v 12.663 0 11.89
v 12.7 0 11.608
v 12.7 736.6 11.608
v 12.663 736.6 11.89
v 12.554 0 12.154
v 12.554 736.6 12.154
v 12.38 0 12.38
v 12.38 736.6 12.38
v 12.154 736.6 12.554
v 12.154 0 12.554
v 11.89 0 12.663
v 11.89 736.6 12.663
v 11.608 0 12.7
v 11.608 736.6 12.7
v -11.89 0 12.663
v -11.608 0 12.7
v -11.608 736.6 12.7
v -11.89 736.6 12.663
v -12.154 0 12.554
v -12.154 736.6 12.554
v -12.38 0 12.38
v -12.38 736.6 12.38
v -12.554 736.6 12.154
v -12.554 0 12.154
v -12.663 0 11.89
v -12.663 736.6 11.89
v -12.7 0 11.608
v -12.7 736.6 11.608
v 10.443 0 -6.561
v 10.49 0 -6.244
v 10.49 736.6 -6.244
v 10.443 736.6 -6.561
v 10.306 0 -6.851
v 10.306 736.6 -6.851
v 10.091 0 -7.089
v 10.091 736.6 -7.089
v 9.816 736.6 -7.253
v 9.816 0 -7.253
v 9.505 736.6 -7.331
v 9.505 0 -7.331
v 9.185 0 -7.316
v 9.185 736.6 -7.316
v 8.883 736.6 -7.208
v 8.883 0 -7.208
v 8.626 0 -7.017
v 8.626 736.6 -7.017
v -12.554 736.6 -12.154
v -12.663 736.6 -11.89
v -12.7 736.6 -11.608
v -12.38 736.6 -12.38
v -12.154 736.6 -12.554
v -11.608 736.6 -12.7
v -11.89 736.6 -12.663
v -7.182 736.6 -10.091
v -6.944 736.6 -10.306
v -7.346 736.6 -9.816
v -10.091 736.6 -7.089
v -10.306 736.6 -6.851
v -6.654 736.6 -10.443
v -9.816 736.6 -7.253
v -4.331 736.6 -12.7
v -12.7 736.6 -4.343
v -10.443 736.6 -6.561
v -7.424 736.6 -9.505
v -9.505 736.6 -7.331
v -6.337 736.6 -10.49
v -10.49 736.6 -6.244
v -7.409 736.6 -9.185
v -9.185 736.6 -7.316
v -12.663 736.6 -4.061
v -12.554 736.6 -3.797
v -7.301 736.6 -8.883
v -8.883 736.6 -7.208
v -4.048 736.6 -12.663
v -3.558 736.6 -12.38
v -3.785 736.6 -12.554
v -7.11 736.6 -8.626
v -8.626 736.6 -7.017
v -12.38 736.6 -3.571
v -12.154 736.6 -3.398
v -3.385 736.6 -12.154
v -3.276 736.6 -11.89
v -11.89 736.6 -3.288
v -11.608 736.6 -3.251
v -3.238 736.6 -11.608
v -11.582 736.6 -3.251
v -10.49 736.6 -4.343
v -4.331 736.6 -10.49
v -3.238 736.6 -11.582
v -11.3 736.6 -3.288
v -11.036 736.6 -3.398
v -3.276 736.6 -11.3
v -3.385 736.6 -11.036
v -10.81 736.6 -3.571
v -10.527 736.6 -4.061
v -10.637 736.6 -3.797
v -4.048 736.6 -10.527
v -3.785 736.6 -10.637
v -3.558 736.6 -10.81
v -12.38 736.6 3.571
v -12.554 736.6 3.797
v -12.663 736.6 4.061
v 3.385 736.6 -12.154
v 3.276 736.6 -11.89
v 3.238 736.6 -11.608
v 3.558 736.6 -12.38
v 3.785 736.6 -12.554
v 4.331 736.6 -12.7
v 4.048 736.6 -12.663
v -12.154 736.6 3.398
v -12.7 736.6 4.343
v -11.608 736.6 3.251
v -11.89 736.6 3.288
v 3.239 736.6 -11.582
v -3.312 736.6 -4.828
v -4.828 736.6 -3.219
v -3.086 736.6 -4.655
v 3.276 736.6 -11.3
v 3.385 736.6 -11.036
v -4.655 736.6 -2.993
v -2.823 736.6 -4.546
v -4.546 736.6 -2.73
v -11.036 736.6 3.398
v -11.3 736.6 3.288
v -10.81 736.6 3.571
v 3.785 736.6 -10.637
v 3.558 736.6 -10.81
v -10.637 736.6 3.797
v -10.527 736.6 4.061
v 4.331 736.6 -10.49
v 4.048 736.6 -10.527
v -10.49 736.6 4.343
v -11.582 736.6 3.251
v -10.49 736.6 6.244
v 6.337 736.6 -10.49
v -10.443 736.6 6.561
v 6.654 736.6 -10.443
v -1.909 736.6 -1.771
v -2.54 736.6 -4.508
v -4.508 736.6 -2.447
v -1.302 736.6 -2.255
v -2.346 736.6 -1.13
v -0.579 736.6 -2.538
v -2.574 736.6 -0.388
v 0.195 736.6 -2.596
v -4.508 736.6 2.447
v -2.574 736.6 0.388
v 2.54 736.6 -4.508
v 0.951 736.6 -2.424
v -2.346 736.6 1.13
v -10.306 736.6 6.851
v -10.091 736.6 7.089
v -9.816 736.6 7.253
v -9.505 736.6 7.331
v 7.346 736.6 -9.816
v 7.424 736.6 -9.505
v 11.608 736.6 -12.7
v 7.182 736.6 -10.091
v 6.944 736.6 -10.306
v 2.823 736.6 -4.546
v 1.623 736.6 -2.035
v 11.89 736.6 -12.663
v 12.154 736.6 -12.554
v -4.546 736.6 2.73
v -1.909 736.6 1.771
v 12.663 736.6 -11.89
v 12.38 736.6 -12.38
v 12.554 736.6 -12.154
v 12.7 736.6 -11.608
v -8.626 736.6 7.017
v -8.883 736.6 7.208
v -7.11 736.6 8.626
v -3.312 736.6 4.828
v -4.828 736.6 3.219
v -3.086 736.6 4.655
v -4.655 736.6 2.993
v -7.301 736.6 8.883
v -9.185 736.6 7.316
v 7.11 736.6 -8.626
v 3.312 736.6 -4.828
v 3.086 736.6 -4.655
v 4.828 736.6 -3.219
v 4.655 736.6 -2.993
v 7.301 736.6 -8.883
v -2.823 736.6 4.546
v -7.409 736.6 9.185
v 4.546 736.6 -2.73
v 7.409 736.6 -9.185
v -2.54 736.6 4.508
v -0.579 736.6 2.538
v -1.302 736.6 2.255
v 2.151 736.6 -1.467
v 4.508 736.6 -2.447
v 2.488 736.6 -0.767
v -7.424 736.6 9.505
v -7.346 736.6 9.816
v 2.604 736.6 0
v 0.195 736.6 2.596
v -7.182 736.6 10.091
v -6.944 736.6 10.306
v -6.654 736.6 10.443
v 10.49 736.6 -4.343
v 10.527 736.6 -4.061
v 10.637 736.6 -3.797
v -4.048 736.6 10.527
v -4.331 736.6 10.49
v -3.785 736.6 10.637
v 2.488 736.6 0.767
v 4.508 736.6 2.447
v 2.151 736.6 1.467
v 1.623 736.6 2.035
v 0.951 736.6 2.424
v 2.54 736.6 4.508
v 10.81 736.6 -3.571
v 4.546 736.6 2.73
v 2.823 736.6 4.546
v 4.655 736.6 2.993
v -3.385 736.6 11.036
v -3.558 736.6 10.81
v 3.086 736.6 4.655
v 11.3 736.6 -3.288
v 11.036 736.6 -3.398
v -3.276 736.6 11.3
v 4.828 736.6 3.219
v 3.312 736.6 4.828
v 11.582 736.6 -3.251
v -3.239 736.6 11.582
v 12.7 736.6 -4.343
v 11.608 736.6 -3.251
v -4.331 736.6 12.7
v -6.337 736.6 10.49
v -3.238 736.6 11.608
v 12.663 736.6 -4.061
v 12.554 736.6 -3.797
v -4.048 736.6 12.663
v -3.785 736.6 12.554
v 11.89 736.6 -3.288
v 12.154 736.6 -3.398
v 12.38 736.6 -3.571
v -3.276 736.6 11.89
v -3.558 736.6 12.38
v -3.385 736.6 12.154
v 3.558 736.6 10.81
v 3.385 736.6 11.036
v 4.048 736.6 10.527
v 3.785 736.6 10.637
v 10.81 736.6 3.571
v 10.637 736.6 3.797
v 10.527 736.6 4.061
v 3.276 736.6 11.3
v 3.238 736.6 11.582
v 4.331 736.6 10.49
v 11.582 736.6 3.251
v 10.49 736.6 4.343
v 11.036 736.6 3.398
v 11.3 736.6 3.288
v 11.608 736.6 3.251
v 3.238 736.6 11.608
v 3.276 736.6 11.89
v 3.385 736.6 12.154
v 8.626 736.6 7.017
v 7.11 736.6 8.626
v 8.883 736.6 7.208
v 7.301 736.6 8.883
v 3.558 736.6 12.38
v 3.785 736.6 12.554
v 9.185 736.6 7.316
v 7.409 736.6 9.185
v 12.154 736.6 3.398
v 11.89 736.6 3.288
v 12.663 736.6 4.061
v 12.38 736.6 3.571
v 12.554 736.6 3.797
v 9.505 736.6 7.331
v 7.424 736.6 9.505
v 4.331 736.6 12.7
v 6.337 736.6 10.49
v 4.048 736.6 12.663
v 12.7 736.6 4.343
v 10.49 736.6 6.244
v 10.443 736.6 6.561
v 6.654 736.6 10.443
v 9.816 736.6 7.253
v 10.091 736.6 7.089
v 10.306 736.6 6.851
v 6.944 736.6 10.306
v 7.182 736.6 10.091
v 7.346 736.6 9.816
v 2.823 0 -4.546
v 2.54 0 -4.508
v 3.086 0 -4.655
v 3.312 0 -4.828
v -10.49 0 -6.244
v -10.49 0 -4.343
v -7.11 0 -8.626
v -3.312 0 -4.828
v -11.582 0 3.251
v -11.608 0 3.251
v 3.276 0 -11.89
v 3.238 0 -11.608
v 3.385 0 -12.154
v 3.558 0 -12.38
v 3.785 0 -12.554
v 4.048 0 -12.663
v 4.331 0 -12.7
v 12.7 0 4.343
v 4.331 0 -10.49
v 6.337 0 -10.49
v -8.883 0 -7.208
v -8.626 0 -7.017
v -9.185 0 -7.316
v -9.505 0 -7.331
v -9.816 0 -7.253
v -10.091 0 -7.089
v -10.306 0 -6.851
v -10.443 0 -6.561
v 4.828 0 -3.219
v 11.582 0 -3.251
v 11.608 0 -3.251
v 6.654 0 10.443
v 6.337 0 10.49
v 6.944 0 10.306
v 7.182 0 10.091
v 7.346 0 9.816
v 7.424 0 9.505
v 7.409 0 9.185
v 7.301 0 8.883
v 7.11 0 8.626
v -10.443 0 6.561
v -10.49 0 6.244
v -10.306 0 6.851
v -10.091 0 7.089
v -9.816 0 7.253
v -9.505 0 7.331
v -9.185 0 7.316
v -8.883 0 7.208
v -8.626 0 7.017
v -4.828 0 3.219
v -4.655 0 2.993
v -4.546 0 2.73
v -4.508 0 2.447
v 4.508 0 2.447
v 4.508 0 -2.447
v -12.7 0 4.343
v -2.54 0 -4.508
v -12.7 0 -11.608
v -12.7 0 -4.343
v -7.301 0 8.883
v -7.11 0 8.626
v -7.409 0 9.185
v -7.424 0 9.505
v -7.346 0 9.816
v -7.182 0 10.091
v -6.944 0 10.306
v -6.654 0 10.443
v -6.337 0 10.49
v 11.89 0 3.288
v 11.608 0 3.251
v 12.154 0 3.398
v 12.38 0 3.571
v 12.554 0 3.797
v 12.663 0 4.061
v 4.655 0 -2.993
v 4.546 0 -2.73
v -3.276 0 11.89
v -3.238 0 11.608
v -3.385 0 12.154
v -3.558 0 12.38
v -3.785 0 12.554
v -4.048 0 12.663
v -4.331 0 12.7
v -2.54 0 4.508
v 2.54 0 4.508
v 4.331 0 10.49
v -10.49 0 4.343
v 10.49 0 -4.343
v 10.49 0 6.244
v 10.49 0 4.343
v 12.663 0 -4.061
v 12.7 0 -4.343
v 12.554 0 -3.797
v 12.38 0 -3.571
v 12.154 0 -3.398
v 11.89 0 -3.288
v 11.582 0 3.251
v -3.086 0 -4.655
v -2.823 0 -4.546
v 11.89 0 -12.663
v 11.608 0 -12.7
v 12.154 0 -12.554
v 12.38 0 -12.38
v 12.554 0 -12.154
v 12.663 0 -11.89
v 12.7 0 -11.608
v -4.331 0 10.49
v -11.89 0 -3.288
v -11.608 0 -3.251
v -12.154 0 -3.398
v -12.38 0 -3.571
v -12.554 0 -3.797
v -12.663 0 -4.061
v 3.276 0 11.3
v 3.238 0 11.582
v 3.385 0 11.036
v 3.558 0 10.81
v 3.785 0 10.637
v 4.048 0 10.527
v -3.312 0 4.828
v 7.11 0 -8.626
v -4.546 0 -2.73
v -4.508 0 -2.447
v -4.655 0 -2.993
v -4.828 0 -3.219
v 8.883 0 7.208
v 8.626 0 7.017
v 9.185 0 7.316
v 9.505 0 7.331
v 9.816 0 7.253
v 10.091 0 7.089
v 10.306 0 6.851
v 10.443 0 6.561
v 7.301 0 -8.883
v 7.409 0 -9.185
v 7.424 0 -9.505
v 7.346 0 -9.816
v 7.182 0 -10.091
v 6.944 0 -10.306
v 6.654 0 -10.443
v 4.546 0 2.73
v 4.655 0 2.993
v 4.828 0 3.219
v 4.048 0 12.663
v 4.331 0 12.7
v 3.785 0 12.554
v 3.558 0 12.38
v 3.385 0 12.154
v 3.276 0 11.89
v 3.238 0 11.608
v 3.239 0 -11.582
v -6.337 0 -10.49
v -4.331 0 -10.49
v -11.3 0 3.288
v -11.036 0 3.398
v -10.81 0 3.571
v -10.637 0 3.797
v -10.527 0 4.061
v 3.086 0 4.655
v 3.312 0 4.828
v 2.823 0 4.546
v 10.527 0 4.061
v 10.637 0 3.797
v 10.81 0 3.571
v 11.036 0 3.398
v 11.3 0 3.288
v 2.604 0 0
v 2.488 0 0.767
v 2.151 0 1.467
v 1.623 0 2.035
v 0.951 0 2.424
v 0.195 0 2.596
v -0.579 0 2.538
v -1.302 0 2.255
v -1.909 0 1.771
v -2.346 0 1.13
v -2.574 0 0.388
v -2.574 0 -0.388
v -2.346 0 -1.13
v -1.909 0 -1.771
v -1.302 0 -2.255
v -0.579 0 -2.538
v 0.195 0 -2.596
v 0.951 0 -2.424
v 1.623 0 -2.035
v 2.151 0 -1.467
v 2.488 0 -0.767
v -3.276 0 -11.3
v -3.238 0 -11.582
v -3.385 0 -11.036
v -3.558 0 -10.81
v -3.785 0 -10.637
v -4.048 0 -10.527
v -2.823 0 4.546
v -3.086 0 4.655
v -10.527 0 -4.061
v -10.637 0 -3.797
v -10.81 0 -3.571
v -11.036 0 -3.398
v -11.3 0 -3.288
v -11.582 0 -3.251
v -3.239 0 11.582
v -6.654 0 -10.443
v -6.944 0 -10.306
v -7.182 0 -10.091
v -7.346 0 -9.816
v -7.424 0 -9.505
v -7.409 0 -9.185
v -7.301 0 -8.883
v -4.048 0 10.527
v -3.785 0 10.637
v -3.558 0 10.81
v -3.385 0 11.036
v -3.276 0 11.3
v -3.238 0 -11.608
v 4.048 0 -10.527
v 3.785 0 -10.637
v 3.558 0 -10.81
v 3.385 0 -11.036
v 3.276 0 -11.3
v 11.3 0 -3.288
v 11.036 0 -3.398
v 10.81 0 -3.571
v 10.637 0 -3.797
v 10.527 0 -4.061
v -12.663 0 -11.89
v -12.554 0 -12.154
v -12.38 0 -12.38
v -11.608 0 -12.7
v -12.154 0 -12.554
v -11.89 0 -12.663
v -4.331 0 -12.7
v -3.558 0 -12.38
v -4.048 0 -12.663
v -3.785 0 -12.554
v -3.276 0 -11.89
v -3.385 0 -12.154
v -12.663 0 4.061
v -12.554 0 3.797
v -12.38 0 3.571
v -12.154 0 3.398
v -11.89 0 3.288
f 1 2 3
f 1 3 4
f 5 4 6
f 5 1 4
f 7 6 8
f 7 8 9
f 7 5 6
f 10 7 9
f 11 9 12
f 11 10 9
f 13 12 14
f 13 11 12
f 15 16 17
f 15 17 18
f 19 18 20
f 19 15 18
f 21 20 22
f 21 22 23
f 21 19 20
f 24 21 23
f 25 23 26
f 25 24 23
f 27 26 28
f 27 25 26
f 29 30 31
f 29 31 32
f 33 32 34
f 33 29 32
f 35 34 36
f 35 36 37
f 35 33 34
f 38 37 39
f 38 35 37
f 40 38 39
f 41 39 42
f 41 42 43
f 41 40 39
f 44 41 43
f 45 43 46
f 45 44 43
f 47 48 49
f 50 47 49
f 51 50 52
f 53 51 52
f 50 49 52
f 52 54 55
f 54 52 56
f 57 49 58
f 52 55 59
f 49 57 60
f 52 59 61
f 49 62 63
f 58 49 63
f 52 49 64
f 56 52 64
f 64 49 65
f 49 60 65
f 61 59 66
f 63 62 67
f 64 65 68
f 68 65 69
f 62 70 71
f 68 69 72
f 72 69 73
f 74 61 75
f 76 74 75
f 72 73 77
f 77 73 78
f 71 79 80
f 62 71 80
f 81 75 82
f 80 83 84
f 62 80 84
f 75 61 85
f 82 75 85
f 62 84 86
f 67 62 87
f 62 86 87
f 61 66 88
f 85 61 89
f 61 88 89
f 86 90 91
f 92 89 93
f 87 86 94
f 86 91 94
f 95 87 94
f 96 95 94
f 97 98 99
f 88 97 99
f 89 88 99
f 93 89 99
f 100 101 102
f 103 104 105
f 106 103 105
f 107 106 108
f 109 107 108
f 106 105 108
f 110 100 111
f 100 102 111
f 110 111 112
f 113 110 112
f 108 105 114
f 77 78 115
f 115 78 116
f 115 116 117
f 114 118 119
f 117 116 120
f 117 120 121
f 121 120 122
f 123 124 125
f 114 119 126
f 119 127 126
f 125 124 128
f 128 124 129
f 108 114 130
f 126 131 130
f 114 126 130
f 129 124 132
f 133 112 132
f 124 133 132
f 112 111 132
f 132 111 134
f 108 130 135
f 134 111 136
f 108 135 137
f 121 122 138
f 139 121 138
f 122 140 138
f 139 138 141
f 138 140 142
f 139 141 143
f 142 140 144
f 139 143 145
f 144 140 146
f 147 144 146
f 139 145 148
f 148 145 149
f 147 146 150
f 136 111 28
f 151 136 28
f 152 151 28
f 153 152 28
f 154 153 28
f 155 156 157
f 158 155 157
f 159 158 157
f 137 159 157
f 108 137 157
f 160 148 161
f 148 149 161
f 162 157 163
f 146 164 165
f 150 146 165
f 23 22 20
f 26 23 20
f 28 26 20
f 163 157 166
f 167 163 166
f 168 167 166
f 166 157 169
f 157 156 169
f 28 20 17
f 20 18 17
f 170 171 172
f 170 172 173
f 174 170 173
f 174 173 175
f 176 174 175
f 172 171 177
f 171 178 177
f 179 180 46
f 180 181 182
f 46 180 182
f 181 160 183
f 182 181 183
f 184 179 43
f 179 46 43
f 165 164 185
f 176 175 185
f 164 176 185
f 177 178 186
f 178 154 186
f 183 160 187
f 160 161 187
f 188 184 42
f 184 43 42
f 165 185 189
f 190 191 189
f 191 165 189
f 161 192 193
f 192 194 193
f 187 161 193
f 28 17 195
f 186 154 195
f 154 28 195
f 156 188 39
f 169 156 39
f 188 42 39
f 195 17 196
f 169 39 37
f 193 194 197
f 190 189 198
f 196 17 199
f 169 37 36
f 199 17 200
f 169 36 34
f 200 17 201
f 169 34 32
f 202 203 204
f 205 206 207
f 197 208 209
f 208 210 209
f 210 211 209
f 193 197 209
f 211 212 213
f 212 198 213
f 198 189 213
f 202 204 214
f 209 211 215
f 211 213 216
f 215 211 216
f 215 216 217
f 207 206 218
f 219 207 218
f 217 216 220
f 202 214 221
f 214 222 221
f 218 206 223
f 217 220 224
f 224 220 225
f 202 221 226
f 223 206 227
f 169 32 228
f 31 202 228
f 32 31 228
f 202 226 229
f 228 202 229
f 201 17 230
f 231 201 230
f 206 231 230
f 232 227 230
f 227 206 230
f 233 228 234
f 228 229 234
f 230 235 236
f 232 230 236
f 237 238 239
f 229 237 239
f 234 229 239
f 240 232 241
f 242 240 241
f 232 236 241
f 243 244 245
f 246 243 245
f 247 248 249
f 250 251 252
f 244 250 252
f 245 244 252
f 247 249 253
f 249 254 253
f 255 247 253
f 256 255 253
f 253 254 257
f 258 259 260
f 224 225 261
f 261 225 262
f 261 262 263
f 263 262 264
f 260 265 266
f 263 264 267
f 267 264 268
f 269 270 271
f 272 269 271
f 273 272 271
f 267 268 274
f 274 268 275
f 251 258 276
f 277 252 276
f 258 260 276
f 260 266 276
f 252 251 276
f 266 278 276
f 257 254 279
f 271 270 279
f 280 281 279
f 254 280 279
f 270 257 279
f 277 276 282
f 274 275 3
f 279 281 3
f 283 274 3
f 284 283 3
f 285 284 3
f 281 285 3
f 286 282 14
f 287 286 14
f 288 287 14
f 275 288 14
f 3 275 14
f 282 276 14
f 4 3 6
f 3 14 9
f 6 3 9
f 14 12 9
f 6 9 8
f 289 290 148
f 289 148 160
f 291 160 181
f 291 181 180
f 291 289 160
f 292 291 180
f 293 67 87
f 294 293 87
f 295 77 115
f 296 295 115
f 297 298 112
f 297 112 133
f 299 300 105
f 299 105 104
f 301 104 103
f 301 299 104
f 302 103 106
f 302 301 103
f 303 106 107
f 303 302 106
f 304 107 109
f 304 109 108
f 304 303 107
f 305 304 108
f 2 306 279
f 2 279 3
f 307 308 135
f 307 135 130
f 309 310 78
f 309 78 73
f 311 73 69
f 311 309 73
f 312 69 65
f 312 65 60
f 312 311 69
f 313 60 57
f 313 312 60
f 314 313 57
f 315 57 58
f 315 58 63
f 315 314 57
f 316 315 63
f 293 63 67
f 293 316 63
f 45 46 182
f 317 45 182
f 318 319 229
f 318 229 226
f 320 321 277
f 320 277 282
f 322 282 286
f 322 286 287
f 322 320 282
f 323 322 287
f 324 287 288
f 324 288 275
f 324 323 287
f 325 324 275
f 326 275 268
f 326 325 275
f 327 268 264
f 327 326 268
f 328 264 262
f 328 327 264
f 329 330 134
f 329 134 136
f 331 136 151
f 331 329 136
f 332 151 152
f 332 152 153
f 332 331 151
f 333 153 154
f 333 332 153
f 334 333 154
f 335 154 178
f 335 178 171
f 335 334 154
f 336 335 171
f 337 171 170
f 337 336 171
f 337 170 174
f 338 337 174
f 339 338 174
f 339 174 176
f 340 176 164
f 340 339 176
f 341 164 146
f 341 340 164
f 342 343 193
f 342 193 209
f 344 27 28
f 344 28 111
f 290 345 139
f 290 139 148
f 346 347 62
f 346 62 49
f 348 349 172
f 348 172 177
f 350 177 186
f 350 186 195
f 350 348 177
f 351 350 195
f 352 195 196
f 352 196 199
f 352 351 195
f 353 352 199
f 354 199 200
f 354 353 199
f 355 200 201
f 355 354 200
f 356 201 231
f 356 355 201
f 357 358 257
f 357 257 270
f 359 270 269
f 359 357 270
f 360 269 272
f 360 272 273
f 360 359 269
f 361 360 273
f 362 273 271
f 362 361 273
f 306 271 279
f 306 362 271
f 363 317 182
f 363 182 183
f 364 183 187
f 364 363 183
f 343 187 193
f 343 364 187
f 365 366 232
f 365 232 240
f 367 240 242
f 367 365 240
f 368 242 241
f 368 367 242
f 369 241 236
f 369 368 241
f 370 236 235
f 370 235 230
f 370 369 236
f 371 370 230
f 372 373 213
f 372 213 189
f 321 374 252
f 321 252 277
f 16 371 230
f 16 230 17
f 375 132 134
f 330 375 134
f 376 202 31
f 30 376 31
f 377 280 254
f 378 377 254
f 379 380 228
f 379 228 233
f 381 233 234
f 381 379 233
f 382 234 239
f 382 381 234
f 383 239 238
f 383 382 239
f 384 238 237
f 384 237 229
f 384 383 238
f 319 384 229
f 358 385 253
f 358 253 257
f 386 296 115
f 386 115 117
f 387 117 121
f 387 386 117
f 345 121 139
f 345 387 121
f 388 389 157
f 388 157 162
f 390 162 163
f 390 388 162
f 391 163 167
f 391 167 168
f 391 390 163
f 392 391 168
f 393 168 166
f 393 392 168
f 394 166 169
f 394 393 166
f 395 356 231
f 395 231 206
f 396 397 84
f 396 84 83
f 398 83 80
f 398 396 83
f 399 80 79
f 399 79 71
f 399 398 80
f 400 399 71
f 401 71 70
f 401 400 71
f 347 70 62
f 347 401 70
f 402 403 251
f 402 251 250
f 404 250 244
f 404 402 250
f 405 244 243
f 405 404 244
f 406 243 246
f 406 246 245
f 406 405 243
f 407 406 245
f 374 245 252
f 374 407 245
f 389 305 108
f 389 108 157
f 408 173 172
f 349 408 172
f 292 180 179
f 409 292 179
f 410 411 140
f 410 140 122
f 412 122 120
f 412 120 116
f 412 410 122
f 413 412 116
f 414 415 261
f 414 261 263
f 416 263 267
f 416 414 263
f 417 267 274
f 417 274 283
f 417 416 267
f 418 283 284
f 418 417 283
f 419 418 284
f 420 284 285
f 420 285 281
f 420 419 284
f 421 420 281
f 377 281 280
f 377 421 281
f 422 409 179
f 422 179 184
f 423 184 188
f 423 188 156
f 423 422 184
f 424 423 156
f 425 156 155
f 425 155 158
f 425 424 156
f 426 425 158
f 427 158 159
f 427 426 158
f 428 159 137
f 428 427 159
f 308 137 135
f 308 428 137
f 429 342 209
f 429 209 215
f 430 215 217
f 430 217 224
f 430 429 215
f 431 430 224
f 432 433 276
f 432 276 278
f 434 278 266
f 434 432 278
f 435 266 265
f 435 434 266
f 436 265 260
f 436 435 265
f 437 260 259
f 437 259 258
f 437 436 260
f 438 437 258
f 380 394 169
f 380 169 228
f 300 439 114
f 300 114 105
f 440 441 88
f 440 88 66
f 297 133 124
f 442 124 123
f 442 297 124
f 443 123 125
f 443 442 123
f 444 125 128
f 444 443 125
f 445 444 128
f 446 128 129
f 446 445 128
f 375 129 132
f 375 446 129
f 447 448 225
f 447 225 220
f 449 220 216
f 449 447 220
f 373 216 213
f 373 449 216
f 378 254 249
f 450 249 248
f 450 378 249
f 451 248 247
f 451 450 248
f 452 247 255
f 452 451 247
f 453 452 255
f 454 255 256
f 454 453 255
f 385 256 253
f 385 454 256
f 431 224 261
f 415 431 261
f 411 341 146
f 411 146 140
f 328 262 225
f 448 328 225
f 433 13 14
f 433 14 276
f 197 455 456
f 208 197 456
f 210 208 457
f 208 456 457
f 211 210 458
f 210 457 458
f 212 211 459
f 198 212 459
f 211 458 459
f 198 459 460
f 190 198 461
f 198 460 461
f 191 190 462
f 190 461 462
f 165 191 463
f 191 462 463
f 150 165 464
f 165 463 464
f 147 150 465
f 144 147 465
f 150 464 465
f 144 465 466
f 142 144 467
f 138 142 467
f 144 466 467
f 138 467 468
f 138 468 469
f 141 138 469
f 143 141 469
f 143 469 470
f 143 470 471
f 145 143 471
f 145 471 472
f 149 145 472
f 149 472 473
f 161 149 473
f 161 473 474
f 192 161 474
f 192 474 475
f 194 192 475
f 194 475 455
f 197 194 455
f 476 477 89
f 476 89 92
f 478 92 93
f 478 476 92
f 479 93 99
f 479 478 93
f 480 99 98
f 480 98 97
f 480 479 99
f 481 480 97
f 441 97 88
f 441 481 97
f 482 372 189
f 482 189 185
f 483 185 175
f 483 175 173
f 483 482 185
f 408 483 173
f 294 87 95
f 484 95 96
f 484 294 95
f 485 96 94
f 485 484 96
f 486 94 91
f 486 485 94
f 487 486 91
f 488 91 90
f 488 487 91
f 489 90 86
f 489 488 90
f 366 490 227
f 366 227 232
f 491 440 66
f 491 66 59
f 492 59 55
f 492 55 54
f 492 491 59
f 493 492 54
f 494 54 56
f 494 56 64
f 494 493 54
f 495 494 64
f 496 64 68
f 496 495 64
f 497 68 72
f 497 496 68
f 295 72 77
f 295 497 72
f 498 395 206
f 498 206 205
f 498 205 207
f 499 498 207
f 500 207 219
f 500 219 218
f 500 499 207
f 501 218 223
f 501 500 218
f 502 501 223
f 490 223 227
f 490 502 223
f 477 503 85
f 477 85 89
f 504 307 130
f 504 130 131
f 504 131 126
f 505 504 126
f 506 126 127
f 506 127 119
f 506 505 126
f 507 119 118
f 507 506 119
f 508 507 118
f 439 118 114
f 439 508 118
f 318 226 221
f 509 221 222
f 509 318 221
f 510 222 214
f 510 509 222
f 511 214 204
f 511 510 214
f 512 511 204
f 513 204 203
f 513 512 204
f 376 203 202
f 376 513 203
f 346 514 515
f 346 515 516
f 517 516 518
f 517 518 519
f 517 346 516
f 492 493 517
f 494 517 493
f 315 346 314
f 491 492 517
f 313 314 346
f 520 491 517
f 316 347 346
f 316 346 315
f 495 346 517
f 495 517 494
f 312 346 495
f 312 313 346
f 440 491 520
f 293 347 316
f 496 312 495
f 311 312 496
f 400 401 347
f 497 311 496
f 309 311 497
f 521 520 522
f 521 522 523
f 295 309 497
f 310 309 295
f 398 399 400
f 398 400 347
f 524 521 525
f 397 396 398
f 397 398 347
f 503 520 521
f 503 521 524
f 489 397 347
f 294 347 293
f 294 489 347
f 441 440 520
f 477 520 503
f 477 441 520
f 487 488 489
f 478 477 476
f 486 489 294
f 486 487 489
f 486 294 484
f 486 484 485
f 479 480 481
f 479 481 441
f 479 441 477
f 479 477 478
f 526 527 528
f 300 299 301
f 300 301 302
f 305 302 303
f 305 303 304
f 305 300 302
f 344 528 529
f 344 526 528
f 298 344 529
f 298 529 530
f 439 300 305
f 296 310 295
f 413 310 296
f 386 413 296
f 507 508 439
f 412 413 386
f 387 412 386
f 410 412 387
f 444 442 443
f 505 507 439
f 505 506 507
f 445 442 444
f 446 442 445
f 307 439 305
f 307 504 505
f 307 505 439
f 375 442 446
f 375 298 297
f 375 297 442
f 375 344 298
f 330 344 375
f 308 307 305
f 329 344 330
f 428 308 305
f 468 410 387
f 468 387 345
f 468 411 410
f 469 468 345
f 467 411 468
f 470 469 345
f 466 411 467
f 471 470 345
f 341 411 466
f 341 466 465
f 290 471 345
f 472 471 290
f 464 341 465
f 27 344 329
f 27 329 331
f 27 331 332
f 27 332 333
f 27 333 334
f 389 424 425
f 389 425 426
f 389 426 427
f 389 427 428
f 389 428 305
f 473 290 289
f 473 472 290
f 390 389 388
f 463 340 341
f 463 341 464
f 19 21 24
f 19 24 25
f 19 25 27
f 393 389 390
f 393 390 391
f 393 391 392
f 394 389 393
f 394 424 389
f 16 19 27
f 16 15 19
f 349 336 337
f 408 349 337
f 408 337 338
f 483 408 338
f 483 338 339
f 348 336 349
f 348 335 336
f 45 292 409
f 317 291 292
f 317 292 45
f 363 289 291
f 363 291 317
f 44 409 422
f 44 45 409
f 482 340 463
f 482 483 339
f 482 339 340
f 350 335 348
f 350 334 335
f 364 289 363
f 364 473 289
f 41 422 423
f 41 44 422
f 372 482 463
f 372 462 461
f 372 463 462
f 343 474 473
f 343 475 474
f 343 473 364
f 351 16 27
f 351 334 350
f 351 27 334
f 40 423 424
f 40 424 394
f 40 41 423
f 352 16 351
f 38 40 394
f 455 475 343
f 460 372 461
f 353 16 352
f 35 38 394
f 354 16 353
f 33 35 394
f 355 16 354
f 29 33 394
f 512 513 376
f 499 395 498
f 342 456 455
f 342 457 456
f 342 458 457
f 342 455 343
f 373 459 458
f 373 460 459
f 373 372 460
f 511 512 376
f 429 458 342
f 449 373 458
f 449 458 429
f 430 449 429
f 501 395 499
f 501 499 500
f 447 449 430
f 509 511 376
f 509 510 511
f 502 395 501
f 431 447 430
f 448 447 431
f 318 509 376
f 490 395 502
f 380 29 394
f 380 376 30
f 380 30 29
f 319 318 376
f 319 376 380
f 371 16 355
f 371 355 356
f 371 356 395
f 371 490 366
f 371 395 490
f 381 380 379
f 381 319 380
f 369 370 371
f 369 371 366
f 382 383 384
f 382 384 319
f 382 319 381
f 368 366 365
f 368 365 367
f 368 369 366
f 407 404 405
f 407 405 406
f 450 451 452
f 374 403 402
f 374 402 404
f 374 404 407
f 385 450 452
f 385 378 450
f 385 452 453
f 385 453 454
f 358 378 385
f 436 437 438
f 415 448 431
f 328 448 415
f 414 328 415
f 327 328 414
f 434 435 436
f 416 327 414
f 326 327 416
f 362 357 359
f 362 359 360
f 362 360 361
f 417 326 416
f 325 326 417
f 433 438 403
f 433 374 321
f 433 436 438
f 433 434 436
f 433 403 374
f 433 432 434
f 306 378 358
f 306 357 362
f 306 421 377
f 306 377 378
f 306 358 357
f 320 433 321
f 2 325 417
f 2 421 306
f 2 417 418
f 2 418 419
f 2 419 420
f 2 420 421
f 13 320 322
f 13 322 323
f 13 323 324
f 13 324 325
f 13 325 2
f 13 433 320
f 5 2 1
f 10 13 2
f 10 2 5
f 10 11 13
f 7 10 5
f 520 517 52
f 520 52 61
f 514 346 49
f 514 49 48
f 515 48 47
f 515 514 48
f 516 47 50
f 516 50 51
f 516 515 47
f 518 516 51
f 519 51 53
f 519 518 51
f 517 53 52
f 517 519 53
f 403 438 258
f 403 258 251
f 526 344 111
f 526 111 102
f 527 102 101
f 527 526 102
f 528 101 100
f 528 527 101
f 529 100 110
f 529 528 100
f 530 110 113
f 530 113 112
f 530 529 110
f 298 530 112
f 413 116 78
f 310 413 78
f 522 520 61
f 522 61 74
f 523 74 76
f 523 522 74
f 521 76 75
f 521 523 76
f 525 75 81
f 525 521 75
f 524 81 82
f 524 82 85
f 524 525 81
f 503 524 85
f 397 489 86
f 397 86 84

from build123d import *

# Parameters (mm, degrees)
F1_DEPTH = 736.6
F2_R     = 2.6035
F3_DEPTH = 736.601


with BuildPart() as f1:
    # F0 (on Front) → F1 (new body)
    with BuildSketch(Plane.XZ):
        with BuildLine():
            Line((-4.5085, 0), (0, 0))
            Line((0, 0), (0, 4.5085))
            Line((0, 4.5085), (-2.54, 4.5085))
            ThreePointArc((-2.54, 4.5085), (-2.957967, 4.591639), (-3.312302, 4.828398))
            Line((-3.312302, 4.828398), (-7.109602, 8.625698))
            ThreePointArc((-7.109602, 8.625698), (-7.346361, 9.815967), (-6.3373, 10.4902))
            Line((-6.3373, 10.4902), (-4.3307, 10.4902))
            ThreePointArc((-4.3307, 10.4902), (-3.558398, 10.810098), (-3.2385, 11.5824))
            Line((-3.2385, 11.5824), (-3.2385, 11.6078))
            ThreePointArc((-3.2385, 11.6078), (-3.558398, 12.380102), (-4.3307, 12.7))
            Line((-4.3307, 12.7), (-11.6078, 12.7))
            ThreePointArc((-11.6078, 12.7), (-12.380102, 12.380102), (-12.7, 11.6078))
            Line((-12.7, 11.6078), (-12.7, 4.3434))
            ThreePointArc((-12.7, 4.3434), (-12.380102, 3.571098), (-11.6078, 3.2512))
            Line((-11.6078, 3.2512), (-11.5824, 3.2512))
            ThreePointArc((-11.5824, 3.2512), (-10.810098, 3.571098), (-10.4902, 4.3434))
            Line((-10.4902, 4.3434), (-10.4902, 6.244363))
            ThreePointArc((-10.4902, 6.244363), (-9.815967, 7.253424), (-8.625698, 7.016665))
            Line((-8.625698, 7.016665), (-4.828398, 3.219365))
            ThreePointArc((-4.828398, 3.219365), (-4.591639, 2.86503), (-4.5085, 2.447063))
            Line((-4.5085, 2.447063), (-4.5085, 0))
        make_face()
        with BuildLine():
            Line((0, 4.5085), (0, 0))
            Line((0, 0), (4.5085, 0))
            Line((4.5085, 0), (4.5085, 2.447063))
            ThreePointArc((4.5085, 2.447063), (4.591639, 2.86503), (4.828398, 3.219365))
            Line((4.828398, 3.219365), (8.625698, 7.016665))
            ThreePointArc((8.625698, 7.016665), (9.815967, 7.253424), (10.4902, 6.244363))
            Line((10.4902, 6.244363), (10.4902, 4.3434))
            ThreePointArc((10.4902, 4.3434), (10.810098, 3.571098), (11.5824, 3.2512))
            Line((11.5824, 3.2512), (11.6078, 3.2512))
            ThreePointArc((11.6078, 3.2512), (12.380102, 3.571098), (12.7, 4.3434))
            Line((12.7, 4.3434), (12.7, 11.6078))
            ThreePointArc((12.7, 11.6078), (12.380102, 12.380102), (11.6078, 12.7))
            Line((11.6078, 12.7), (4.3307, 12.7))
            ThreePointArc((4.3307, 12.7), (3.558398, 12.380102), (3.2385, 11.6078))
            Line((3.2385, 11.6078), (3.2385, 11.5824))
            ThreePointArc((3.2385, 11.5824), (3.558398, 10.810098), (4.3307, 10.4902))
            Line((4.3307, 10.4902), (6.3373, 10.4902))
            ThreePointArc((6.3373, 10.4902), (7.346361, 9.815967), (7.109602, 8.625698))
            Line((7.109602, 8.625698), (3.312302, 4.828398))
            ThreePointArc((3.312302, 4.828398), (2.957967, 4.591639), (2.54, 4.5085))
            Line((2.54, 4.5085), (0, 4.5085))
        make_face()
        with BuildLine():
            Line((4.5085, 0), (0, 0))
            Line((0, 0), (0, -4.5085))
            Line((0, -4.5085), (2.54, -4.5085))
            ThreePointArc((2.54, -4.5085), (2.957967, -4.591639), (3.312302, -4.828398))
            Line((3.312302, -4.828398), (7.109602, -8.625698))
            ThreePointArc((7.109602, -8.625698), (7.346361, -9.815967), (6.3373, -10.4902))
            Line((6.3373, -10.4902), (4.3307, -10.4902))
            ThreePointArc((4.3307, -10.4902), (3.558398, -10.810098), (3.2385, -11.5824))
            Line((3.2385, -11.5824), (3.2385, -11.6078))
            ThreePointArc((3.2385, -11.6078), (3.558398, -12.380102), (4.3307, -12.7))
            Line((4.3307, -12.7), (11.6078, -12.7))
            ThreePointArc((11.6078, -12.7), (12.380102, -12.380102), (12.7, -11.6078))
            Line((12.7, -11.6078), (12.7, -4.3434))
            ThreePointArc((12.7, -4.3434), (12.380102, -3.571098), (11.6078, -3.2512))
            Line((11.6078, -3.2512), (11.5824, -3.2512))
            ThreePointArc((11.5824, -3.2512), (10.810098, -3.571098), (10.4902, -4.3434))
            Line((10.4902, -4.3434), (10.4902, -6.244363))
            ThreePointArc((10.4902, -6.244363), (9.815967, -7.253424), (8.625698, -7.016665))
            Line((8.625698, -7.016665), (4.828398, -3.219365))
            ThreePointArc((4.828398, -3.219365), (4.591639, -2.86503), (4.5085, -2.447063))
            Line((4.5085, -2.447063), (4.5085, 0))
        make_face()
        with BuildLine():
            Line((0, -4.5085), (0, 0))
            Line((0, 0), (-4.5085, 0))
            Line((-4.5085, 0), (-4.5085, -2.447063))
            ThreePointArc((-4.5085, -2.447063), (-4.591639, -2.86503), (-4.828398, -3.219365))
            Line((-4.828398, -3.219365), (-8.625698, -7.016665))
            ThreePointArc((-8.625698, -7.016665), (-9.815967, -7.253424), (-10.4902, -6.244363))
            Line((-10.4902, -6.244363), (-10.4902, -4.3434))
            ThreePointArc((-10.4902, -4.3434), (-10.810098, -3.571098), (-11.5824, -3.2512))
            Line((-11.5824, -3.2512), (-11.6078, -3.2512))
            ThreePointArc((-11.6078, -3.2512), (-12.380102, -3.571098), (-12.7, -4.3434))
            Line((-12.7, -4.3434), (-12.7, -11.6078))
            ThreePointArc((-12.7, -11.6078), (-12.380102, -12.380102), (-11.6078, -12.7))
            Line((-11.6078, -12.7), (-4.3307, -12.7))
            ThreePointArc((-4.3307, -12.7), (-3.558398, -12.380102), (-3.2385, -11.6078))
            Line((-3.2385, -11.6078), (-3.2385, -11.5824))
            ThreePointArc((-3.2385, -11.5824), (-3.558398, -10.810098), (-4.3307, -10.4902))
            Line((-4.3307, -10.4902), (-6.3373, -10.4902))
            ThreePointArc((-6.3373, -10.4902), (-7.346361, -9.815967), (-7.109602, -8.625698))
            Line((-7.109602, -8.625698), (-3.312302, -4.828398))
            ThreePointArc((-3.312302, -4.828398), (-2.957967, -4.591639), (-2.54, -4.5085))
            Line((-2.54, -4.5085), (0, -4.5085))
        make_face()
    extrude(amount=-F1_DEPTH)

    # F2 (on face) → F3 (cut, through all)
    with BuildSketch(Plane.XZ):
        Circle(F2_R)
    extrude(amount=-F3_DEPTH, mode=Mode.SUBTRACT)


solid = f1.part
